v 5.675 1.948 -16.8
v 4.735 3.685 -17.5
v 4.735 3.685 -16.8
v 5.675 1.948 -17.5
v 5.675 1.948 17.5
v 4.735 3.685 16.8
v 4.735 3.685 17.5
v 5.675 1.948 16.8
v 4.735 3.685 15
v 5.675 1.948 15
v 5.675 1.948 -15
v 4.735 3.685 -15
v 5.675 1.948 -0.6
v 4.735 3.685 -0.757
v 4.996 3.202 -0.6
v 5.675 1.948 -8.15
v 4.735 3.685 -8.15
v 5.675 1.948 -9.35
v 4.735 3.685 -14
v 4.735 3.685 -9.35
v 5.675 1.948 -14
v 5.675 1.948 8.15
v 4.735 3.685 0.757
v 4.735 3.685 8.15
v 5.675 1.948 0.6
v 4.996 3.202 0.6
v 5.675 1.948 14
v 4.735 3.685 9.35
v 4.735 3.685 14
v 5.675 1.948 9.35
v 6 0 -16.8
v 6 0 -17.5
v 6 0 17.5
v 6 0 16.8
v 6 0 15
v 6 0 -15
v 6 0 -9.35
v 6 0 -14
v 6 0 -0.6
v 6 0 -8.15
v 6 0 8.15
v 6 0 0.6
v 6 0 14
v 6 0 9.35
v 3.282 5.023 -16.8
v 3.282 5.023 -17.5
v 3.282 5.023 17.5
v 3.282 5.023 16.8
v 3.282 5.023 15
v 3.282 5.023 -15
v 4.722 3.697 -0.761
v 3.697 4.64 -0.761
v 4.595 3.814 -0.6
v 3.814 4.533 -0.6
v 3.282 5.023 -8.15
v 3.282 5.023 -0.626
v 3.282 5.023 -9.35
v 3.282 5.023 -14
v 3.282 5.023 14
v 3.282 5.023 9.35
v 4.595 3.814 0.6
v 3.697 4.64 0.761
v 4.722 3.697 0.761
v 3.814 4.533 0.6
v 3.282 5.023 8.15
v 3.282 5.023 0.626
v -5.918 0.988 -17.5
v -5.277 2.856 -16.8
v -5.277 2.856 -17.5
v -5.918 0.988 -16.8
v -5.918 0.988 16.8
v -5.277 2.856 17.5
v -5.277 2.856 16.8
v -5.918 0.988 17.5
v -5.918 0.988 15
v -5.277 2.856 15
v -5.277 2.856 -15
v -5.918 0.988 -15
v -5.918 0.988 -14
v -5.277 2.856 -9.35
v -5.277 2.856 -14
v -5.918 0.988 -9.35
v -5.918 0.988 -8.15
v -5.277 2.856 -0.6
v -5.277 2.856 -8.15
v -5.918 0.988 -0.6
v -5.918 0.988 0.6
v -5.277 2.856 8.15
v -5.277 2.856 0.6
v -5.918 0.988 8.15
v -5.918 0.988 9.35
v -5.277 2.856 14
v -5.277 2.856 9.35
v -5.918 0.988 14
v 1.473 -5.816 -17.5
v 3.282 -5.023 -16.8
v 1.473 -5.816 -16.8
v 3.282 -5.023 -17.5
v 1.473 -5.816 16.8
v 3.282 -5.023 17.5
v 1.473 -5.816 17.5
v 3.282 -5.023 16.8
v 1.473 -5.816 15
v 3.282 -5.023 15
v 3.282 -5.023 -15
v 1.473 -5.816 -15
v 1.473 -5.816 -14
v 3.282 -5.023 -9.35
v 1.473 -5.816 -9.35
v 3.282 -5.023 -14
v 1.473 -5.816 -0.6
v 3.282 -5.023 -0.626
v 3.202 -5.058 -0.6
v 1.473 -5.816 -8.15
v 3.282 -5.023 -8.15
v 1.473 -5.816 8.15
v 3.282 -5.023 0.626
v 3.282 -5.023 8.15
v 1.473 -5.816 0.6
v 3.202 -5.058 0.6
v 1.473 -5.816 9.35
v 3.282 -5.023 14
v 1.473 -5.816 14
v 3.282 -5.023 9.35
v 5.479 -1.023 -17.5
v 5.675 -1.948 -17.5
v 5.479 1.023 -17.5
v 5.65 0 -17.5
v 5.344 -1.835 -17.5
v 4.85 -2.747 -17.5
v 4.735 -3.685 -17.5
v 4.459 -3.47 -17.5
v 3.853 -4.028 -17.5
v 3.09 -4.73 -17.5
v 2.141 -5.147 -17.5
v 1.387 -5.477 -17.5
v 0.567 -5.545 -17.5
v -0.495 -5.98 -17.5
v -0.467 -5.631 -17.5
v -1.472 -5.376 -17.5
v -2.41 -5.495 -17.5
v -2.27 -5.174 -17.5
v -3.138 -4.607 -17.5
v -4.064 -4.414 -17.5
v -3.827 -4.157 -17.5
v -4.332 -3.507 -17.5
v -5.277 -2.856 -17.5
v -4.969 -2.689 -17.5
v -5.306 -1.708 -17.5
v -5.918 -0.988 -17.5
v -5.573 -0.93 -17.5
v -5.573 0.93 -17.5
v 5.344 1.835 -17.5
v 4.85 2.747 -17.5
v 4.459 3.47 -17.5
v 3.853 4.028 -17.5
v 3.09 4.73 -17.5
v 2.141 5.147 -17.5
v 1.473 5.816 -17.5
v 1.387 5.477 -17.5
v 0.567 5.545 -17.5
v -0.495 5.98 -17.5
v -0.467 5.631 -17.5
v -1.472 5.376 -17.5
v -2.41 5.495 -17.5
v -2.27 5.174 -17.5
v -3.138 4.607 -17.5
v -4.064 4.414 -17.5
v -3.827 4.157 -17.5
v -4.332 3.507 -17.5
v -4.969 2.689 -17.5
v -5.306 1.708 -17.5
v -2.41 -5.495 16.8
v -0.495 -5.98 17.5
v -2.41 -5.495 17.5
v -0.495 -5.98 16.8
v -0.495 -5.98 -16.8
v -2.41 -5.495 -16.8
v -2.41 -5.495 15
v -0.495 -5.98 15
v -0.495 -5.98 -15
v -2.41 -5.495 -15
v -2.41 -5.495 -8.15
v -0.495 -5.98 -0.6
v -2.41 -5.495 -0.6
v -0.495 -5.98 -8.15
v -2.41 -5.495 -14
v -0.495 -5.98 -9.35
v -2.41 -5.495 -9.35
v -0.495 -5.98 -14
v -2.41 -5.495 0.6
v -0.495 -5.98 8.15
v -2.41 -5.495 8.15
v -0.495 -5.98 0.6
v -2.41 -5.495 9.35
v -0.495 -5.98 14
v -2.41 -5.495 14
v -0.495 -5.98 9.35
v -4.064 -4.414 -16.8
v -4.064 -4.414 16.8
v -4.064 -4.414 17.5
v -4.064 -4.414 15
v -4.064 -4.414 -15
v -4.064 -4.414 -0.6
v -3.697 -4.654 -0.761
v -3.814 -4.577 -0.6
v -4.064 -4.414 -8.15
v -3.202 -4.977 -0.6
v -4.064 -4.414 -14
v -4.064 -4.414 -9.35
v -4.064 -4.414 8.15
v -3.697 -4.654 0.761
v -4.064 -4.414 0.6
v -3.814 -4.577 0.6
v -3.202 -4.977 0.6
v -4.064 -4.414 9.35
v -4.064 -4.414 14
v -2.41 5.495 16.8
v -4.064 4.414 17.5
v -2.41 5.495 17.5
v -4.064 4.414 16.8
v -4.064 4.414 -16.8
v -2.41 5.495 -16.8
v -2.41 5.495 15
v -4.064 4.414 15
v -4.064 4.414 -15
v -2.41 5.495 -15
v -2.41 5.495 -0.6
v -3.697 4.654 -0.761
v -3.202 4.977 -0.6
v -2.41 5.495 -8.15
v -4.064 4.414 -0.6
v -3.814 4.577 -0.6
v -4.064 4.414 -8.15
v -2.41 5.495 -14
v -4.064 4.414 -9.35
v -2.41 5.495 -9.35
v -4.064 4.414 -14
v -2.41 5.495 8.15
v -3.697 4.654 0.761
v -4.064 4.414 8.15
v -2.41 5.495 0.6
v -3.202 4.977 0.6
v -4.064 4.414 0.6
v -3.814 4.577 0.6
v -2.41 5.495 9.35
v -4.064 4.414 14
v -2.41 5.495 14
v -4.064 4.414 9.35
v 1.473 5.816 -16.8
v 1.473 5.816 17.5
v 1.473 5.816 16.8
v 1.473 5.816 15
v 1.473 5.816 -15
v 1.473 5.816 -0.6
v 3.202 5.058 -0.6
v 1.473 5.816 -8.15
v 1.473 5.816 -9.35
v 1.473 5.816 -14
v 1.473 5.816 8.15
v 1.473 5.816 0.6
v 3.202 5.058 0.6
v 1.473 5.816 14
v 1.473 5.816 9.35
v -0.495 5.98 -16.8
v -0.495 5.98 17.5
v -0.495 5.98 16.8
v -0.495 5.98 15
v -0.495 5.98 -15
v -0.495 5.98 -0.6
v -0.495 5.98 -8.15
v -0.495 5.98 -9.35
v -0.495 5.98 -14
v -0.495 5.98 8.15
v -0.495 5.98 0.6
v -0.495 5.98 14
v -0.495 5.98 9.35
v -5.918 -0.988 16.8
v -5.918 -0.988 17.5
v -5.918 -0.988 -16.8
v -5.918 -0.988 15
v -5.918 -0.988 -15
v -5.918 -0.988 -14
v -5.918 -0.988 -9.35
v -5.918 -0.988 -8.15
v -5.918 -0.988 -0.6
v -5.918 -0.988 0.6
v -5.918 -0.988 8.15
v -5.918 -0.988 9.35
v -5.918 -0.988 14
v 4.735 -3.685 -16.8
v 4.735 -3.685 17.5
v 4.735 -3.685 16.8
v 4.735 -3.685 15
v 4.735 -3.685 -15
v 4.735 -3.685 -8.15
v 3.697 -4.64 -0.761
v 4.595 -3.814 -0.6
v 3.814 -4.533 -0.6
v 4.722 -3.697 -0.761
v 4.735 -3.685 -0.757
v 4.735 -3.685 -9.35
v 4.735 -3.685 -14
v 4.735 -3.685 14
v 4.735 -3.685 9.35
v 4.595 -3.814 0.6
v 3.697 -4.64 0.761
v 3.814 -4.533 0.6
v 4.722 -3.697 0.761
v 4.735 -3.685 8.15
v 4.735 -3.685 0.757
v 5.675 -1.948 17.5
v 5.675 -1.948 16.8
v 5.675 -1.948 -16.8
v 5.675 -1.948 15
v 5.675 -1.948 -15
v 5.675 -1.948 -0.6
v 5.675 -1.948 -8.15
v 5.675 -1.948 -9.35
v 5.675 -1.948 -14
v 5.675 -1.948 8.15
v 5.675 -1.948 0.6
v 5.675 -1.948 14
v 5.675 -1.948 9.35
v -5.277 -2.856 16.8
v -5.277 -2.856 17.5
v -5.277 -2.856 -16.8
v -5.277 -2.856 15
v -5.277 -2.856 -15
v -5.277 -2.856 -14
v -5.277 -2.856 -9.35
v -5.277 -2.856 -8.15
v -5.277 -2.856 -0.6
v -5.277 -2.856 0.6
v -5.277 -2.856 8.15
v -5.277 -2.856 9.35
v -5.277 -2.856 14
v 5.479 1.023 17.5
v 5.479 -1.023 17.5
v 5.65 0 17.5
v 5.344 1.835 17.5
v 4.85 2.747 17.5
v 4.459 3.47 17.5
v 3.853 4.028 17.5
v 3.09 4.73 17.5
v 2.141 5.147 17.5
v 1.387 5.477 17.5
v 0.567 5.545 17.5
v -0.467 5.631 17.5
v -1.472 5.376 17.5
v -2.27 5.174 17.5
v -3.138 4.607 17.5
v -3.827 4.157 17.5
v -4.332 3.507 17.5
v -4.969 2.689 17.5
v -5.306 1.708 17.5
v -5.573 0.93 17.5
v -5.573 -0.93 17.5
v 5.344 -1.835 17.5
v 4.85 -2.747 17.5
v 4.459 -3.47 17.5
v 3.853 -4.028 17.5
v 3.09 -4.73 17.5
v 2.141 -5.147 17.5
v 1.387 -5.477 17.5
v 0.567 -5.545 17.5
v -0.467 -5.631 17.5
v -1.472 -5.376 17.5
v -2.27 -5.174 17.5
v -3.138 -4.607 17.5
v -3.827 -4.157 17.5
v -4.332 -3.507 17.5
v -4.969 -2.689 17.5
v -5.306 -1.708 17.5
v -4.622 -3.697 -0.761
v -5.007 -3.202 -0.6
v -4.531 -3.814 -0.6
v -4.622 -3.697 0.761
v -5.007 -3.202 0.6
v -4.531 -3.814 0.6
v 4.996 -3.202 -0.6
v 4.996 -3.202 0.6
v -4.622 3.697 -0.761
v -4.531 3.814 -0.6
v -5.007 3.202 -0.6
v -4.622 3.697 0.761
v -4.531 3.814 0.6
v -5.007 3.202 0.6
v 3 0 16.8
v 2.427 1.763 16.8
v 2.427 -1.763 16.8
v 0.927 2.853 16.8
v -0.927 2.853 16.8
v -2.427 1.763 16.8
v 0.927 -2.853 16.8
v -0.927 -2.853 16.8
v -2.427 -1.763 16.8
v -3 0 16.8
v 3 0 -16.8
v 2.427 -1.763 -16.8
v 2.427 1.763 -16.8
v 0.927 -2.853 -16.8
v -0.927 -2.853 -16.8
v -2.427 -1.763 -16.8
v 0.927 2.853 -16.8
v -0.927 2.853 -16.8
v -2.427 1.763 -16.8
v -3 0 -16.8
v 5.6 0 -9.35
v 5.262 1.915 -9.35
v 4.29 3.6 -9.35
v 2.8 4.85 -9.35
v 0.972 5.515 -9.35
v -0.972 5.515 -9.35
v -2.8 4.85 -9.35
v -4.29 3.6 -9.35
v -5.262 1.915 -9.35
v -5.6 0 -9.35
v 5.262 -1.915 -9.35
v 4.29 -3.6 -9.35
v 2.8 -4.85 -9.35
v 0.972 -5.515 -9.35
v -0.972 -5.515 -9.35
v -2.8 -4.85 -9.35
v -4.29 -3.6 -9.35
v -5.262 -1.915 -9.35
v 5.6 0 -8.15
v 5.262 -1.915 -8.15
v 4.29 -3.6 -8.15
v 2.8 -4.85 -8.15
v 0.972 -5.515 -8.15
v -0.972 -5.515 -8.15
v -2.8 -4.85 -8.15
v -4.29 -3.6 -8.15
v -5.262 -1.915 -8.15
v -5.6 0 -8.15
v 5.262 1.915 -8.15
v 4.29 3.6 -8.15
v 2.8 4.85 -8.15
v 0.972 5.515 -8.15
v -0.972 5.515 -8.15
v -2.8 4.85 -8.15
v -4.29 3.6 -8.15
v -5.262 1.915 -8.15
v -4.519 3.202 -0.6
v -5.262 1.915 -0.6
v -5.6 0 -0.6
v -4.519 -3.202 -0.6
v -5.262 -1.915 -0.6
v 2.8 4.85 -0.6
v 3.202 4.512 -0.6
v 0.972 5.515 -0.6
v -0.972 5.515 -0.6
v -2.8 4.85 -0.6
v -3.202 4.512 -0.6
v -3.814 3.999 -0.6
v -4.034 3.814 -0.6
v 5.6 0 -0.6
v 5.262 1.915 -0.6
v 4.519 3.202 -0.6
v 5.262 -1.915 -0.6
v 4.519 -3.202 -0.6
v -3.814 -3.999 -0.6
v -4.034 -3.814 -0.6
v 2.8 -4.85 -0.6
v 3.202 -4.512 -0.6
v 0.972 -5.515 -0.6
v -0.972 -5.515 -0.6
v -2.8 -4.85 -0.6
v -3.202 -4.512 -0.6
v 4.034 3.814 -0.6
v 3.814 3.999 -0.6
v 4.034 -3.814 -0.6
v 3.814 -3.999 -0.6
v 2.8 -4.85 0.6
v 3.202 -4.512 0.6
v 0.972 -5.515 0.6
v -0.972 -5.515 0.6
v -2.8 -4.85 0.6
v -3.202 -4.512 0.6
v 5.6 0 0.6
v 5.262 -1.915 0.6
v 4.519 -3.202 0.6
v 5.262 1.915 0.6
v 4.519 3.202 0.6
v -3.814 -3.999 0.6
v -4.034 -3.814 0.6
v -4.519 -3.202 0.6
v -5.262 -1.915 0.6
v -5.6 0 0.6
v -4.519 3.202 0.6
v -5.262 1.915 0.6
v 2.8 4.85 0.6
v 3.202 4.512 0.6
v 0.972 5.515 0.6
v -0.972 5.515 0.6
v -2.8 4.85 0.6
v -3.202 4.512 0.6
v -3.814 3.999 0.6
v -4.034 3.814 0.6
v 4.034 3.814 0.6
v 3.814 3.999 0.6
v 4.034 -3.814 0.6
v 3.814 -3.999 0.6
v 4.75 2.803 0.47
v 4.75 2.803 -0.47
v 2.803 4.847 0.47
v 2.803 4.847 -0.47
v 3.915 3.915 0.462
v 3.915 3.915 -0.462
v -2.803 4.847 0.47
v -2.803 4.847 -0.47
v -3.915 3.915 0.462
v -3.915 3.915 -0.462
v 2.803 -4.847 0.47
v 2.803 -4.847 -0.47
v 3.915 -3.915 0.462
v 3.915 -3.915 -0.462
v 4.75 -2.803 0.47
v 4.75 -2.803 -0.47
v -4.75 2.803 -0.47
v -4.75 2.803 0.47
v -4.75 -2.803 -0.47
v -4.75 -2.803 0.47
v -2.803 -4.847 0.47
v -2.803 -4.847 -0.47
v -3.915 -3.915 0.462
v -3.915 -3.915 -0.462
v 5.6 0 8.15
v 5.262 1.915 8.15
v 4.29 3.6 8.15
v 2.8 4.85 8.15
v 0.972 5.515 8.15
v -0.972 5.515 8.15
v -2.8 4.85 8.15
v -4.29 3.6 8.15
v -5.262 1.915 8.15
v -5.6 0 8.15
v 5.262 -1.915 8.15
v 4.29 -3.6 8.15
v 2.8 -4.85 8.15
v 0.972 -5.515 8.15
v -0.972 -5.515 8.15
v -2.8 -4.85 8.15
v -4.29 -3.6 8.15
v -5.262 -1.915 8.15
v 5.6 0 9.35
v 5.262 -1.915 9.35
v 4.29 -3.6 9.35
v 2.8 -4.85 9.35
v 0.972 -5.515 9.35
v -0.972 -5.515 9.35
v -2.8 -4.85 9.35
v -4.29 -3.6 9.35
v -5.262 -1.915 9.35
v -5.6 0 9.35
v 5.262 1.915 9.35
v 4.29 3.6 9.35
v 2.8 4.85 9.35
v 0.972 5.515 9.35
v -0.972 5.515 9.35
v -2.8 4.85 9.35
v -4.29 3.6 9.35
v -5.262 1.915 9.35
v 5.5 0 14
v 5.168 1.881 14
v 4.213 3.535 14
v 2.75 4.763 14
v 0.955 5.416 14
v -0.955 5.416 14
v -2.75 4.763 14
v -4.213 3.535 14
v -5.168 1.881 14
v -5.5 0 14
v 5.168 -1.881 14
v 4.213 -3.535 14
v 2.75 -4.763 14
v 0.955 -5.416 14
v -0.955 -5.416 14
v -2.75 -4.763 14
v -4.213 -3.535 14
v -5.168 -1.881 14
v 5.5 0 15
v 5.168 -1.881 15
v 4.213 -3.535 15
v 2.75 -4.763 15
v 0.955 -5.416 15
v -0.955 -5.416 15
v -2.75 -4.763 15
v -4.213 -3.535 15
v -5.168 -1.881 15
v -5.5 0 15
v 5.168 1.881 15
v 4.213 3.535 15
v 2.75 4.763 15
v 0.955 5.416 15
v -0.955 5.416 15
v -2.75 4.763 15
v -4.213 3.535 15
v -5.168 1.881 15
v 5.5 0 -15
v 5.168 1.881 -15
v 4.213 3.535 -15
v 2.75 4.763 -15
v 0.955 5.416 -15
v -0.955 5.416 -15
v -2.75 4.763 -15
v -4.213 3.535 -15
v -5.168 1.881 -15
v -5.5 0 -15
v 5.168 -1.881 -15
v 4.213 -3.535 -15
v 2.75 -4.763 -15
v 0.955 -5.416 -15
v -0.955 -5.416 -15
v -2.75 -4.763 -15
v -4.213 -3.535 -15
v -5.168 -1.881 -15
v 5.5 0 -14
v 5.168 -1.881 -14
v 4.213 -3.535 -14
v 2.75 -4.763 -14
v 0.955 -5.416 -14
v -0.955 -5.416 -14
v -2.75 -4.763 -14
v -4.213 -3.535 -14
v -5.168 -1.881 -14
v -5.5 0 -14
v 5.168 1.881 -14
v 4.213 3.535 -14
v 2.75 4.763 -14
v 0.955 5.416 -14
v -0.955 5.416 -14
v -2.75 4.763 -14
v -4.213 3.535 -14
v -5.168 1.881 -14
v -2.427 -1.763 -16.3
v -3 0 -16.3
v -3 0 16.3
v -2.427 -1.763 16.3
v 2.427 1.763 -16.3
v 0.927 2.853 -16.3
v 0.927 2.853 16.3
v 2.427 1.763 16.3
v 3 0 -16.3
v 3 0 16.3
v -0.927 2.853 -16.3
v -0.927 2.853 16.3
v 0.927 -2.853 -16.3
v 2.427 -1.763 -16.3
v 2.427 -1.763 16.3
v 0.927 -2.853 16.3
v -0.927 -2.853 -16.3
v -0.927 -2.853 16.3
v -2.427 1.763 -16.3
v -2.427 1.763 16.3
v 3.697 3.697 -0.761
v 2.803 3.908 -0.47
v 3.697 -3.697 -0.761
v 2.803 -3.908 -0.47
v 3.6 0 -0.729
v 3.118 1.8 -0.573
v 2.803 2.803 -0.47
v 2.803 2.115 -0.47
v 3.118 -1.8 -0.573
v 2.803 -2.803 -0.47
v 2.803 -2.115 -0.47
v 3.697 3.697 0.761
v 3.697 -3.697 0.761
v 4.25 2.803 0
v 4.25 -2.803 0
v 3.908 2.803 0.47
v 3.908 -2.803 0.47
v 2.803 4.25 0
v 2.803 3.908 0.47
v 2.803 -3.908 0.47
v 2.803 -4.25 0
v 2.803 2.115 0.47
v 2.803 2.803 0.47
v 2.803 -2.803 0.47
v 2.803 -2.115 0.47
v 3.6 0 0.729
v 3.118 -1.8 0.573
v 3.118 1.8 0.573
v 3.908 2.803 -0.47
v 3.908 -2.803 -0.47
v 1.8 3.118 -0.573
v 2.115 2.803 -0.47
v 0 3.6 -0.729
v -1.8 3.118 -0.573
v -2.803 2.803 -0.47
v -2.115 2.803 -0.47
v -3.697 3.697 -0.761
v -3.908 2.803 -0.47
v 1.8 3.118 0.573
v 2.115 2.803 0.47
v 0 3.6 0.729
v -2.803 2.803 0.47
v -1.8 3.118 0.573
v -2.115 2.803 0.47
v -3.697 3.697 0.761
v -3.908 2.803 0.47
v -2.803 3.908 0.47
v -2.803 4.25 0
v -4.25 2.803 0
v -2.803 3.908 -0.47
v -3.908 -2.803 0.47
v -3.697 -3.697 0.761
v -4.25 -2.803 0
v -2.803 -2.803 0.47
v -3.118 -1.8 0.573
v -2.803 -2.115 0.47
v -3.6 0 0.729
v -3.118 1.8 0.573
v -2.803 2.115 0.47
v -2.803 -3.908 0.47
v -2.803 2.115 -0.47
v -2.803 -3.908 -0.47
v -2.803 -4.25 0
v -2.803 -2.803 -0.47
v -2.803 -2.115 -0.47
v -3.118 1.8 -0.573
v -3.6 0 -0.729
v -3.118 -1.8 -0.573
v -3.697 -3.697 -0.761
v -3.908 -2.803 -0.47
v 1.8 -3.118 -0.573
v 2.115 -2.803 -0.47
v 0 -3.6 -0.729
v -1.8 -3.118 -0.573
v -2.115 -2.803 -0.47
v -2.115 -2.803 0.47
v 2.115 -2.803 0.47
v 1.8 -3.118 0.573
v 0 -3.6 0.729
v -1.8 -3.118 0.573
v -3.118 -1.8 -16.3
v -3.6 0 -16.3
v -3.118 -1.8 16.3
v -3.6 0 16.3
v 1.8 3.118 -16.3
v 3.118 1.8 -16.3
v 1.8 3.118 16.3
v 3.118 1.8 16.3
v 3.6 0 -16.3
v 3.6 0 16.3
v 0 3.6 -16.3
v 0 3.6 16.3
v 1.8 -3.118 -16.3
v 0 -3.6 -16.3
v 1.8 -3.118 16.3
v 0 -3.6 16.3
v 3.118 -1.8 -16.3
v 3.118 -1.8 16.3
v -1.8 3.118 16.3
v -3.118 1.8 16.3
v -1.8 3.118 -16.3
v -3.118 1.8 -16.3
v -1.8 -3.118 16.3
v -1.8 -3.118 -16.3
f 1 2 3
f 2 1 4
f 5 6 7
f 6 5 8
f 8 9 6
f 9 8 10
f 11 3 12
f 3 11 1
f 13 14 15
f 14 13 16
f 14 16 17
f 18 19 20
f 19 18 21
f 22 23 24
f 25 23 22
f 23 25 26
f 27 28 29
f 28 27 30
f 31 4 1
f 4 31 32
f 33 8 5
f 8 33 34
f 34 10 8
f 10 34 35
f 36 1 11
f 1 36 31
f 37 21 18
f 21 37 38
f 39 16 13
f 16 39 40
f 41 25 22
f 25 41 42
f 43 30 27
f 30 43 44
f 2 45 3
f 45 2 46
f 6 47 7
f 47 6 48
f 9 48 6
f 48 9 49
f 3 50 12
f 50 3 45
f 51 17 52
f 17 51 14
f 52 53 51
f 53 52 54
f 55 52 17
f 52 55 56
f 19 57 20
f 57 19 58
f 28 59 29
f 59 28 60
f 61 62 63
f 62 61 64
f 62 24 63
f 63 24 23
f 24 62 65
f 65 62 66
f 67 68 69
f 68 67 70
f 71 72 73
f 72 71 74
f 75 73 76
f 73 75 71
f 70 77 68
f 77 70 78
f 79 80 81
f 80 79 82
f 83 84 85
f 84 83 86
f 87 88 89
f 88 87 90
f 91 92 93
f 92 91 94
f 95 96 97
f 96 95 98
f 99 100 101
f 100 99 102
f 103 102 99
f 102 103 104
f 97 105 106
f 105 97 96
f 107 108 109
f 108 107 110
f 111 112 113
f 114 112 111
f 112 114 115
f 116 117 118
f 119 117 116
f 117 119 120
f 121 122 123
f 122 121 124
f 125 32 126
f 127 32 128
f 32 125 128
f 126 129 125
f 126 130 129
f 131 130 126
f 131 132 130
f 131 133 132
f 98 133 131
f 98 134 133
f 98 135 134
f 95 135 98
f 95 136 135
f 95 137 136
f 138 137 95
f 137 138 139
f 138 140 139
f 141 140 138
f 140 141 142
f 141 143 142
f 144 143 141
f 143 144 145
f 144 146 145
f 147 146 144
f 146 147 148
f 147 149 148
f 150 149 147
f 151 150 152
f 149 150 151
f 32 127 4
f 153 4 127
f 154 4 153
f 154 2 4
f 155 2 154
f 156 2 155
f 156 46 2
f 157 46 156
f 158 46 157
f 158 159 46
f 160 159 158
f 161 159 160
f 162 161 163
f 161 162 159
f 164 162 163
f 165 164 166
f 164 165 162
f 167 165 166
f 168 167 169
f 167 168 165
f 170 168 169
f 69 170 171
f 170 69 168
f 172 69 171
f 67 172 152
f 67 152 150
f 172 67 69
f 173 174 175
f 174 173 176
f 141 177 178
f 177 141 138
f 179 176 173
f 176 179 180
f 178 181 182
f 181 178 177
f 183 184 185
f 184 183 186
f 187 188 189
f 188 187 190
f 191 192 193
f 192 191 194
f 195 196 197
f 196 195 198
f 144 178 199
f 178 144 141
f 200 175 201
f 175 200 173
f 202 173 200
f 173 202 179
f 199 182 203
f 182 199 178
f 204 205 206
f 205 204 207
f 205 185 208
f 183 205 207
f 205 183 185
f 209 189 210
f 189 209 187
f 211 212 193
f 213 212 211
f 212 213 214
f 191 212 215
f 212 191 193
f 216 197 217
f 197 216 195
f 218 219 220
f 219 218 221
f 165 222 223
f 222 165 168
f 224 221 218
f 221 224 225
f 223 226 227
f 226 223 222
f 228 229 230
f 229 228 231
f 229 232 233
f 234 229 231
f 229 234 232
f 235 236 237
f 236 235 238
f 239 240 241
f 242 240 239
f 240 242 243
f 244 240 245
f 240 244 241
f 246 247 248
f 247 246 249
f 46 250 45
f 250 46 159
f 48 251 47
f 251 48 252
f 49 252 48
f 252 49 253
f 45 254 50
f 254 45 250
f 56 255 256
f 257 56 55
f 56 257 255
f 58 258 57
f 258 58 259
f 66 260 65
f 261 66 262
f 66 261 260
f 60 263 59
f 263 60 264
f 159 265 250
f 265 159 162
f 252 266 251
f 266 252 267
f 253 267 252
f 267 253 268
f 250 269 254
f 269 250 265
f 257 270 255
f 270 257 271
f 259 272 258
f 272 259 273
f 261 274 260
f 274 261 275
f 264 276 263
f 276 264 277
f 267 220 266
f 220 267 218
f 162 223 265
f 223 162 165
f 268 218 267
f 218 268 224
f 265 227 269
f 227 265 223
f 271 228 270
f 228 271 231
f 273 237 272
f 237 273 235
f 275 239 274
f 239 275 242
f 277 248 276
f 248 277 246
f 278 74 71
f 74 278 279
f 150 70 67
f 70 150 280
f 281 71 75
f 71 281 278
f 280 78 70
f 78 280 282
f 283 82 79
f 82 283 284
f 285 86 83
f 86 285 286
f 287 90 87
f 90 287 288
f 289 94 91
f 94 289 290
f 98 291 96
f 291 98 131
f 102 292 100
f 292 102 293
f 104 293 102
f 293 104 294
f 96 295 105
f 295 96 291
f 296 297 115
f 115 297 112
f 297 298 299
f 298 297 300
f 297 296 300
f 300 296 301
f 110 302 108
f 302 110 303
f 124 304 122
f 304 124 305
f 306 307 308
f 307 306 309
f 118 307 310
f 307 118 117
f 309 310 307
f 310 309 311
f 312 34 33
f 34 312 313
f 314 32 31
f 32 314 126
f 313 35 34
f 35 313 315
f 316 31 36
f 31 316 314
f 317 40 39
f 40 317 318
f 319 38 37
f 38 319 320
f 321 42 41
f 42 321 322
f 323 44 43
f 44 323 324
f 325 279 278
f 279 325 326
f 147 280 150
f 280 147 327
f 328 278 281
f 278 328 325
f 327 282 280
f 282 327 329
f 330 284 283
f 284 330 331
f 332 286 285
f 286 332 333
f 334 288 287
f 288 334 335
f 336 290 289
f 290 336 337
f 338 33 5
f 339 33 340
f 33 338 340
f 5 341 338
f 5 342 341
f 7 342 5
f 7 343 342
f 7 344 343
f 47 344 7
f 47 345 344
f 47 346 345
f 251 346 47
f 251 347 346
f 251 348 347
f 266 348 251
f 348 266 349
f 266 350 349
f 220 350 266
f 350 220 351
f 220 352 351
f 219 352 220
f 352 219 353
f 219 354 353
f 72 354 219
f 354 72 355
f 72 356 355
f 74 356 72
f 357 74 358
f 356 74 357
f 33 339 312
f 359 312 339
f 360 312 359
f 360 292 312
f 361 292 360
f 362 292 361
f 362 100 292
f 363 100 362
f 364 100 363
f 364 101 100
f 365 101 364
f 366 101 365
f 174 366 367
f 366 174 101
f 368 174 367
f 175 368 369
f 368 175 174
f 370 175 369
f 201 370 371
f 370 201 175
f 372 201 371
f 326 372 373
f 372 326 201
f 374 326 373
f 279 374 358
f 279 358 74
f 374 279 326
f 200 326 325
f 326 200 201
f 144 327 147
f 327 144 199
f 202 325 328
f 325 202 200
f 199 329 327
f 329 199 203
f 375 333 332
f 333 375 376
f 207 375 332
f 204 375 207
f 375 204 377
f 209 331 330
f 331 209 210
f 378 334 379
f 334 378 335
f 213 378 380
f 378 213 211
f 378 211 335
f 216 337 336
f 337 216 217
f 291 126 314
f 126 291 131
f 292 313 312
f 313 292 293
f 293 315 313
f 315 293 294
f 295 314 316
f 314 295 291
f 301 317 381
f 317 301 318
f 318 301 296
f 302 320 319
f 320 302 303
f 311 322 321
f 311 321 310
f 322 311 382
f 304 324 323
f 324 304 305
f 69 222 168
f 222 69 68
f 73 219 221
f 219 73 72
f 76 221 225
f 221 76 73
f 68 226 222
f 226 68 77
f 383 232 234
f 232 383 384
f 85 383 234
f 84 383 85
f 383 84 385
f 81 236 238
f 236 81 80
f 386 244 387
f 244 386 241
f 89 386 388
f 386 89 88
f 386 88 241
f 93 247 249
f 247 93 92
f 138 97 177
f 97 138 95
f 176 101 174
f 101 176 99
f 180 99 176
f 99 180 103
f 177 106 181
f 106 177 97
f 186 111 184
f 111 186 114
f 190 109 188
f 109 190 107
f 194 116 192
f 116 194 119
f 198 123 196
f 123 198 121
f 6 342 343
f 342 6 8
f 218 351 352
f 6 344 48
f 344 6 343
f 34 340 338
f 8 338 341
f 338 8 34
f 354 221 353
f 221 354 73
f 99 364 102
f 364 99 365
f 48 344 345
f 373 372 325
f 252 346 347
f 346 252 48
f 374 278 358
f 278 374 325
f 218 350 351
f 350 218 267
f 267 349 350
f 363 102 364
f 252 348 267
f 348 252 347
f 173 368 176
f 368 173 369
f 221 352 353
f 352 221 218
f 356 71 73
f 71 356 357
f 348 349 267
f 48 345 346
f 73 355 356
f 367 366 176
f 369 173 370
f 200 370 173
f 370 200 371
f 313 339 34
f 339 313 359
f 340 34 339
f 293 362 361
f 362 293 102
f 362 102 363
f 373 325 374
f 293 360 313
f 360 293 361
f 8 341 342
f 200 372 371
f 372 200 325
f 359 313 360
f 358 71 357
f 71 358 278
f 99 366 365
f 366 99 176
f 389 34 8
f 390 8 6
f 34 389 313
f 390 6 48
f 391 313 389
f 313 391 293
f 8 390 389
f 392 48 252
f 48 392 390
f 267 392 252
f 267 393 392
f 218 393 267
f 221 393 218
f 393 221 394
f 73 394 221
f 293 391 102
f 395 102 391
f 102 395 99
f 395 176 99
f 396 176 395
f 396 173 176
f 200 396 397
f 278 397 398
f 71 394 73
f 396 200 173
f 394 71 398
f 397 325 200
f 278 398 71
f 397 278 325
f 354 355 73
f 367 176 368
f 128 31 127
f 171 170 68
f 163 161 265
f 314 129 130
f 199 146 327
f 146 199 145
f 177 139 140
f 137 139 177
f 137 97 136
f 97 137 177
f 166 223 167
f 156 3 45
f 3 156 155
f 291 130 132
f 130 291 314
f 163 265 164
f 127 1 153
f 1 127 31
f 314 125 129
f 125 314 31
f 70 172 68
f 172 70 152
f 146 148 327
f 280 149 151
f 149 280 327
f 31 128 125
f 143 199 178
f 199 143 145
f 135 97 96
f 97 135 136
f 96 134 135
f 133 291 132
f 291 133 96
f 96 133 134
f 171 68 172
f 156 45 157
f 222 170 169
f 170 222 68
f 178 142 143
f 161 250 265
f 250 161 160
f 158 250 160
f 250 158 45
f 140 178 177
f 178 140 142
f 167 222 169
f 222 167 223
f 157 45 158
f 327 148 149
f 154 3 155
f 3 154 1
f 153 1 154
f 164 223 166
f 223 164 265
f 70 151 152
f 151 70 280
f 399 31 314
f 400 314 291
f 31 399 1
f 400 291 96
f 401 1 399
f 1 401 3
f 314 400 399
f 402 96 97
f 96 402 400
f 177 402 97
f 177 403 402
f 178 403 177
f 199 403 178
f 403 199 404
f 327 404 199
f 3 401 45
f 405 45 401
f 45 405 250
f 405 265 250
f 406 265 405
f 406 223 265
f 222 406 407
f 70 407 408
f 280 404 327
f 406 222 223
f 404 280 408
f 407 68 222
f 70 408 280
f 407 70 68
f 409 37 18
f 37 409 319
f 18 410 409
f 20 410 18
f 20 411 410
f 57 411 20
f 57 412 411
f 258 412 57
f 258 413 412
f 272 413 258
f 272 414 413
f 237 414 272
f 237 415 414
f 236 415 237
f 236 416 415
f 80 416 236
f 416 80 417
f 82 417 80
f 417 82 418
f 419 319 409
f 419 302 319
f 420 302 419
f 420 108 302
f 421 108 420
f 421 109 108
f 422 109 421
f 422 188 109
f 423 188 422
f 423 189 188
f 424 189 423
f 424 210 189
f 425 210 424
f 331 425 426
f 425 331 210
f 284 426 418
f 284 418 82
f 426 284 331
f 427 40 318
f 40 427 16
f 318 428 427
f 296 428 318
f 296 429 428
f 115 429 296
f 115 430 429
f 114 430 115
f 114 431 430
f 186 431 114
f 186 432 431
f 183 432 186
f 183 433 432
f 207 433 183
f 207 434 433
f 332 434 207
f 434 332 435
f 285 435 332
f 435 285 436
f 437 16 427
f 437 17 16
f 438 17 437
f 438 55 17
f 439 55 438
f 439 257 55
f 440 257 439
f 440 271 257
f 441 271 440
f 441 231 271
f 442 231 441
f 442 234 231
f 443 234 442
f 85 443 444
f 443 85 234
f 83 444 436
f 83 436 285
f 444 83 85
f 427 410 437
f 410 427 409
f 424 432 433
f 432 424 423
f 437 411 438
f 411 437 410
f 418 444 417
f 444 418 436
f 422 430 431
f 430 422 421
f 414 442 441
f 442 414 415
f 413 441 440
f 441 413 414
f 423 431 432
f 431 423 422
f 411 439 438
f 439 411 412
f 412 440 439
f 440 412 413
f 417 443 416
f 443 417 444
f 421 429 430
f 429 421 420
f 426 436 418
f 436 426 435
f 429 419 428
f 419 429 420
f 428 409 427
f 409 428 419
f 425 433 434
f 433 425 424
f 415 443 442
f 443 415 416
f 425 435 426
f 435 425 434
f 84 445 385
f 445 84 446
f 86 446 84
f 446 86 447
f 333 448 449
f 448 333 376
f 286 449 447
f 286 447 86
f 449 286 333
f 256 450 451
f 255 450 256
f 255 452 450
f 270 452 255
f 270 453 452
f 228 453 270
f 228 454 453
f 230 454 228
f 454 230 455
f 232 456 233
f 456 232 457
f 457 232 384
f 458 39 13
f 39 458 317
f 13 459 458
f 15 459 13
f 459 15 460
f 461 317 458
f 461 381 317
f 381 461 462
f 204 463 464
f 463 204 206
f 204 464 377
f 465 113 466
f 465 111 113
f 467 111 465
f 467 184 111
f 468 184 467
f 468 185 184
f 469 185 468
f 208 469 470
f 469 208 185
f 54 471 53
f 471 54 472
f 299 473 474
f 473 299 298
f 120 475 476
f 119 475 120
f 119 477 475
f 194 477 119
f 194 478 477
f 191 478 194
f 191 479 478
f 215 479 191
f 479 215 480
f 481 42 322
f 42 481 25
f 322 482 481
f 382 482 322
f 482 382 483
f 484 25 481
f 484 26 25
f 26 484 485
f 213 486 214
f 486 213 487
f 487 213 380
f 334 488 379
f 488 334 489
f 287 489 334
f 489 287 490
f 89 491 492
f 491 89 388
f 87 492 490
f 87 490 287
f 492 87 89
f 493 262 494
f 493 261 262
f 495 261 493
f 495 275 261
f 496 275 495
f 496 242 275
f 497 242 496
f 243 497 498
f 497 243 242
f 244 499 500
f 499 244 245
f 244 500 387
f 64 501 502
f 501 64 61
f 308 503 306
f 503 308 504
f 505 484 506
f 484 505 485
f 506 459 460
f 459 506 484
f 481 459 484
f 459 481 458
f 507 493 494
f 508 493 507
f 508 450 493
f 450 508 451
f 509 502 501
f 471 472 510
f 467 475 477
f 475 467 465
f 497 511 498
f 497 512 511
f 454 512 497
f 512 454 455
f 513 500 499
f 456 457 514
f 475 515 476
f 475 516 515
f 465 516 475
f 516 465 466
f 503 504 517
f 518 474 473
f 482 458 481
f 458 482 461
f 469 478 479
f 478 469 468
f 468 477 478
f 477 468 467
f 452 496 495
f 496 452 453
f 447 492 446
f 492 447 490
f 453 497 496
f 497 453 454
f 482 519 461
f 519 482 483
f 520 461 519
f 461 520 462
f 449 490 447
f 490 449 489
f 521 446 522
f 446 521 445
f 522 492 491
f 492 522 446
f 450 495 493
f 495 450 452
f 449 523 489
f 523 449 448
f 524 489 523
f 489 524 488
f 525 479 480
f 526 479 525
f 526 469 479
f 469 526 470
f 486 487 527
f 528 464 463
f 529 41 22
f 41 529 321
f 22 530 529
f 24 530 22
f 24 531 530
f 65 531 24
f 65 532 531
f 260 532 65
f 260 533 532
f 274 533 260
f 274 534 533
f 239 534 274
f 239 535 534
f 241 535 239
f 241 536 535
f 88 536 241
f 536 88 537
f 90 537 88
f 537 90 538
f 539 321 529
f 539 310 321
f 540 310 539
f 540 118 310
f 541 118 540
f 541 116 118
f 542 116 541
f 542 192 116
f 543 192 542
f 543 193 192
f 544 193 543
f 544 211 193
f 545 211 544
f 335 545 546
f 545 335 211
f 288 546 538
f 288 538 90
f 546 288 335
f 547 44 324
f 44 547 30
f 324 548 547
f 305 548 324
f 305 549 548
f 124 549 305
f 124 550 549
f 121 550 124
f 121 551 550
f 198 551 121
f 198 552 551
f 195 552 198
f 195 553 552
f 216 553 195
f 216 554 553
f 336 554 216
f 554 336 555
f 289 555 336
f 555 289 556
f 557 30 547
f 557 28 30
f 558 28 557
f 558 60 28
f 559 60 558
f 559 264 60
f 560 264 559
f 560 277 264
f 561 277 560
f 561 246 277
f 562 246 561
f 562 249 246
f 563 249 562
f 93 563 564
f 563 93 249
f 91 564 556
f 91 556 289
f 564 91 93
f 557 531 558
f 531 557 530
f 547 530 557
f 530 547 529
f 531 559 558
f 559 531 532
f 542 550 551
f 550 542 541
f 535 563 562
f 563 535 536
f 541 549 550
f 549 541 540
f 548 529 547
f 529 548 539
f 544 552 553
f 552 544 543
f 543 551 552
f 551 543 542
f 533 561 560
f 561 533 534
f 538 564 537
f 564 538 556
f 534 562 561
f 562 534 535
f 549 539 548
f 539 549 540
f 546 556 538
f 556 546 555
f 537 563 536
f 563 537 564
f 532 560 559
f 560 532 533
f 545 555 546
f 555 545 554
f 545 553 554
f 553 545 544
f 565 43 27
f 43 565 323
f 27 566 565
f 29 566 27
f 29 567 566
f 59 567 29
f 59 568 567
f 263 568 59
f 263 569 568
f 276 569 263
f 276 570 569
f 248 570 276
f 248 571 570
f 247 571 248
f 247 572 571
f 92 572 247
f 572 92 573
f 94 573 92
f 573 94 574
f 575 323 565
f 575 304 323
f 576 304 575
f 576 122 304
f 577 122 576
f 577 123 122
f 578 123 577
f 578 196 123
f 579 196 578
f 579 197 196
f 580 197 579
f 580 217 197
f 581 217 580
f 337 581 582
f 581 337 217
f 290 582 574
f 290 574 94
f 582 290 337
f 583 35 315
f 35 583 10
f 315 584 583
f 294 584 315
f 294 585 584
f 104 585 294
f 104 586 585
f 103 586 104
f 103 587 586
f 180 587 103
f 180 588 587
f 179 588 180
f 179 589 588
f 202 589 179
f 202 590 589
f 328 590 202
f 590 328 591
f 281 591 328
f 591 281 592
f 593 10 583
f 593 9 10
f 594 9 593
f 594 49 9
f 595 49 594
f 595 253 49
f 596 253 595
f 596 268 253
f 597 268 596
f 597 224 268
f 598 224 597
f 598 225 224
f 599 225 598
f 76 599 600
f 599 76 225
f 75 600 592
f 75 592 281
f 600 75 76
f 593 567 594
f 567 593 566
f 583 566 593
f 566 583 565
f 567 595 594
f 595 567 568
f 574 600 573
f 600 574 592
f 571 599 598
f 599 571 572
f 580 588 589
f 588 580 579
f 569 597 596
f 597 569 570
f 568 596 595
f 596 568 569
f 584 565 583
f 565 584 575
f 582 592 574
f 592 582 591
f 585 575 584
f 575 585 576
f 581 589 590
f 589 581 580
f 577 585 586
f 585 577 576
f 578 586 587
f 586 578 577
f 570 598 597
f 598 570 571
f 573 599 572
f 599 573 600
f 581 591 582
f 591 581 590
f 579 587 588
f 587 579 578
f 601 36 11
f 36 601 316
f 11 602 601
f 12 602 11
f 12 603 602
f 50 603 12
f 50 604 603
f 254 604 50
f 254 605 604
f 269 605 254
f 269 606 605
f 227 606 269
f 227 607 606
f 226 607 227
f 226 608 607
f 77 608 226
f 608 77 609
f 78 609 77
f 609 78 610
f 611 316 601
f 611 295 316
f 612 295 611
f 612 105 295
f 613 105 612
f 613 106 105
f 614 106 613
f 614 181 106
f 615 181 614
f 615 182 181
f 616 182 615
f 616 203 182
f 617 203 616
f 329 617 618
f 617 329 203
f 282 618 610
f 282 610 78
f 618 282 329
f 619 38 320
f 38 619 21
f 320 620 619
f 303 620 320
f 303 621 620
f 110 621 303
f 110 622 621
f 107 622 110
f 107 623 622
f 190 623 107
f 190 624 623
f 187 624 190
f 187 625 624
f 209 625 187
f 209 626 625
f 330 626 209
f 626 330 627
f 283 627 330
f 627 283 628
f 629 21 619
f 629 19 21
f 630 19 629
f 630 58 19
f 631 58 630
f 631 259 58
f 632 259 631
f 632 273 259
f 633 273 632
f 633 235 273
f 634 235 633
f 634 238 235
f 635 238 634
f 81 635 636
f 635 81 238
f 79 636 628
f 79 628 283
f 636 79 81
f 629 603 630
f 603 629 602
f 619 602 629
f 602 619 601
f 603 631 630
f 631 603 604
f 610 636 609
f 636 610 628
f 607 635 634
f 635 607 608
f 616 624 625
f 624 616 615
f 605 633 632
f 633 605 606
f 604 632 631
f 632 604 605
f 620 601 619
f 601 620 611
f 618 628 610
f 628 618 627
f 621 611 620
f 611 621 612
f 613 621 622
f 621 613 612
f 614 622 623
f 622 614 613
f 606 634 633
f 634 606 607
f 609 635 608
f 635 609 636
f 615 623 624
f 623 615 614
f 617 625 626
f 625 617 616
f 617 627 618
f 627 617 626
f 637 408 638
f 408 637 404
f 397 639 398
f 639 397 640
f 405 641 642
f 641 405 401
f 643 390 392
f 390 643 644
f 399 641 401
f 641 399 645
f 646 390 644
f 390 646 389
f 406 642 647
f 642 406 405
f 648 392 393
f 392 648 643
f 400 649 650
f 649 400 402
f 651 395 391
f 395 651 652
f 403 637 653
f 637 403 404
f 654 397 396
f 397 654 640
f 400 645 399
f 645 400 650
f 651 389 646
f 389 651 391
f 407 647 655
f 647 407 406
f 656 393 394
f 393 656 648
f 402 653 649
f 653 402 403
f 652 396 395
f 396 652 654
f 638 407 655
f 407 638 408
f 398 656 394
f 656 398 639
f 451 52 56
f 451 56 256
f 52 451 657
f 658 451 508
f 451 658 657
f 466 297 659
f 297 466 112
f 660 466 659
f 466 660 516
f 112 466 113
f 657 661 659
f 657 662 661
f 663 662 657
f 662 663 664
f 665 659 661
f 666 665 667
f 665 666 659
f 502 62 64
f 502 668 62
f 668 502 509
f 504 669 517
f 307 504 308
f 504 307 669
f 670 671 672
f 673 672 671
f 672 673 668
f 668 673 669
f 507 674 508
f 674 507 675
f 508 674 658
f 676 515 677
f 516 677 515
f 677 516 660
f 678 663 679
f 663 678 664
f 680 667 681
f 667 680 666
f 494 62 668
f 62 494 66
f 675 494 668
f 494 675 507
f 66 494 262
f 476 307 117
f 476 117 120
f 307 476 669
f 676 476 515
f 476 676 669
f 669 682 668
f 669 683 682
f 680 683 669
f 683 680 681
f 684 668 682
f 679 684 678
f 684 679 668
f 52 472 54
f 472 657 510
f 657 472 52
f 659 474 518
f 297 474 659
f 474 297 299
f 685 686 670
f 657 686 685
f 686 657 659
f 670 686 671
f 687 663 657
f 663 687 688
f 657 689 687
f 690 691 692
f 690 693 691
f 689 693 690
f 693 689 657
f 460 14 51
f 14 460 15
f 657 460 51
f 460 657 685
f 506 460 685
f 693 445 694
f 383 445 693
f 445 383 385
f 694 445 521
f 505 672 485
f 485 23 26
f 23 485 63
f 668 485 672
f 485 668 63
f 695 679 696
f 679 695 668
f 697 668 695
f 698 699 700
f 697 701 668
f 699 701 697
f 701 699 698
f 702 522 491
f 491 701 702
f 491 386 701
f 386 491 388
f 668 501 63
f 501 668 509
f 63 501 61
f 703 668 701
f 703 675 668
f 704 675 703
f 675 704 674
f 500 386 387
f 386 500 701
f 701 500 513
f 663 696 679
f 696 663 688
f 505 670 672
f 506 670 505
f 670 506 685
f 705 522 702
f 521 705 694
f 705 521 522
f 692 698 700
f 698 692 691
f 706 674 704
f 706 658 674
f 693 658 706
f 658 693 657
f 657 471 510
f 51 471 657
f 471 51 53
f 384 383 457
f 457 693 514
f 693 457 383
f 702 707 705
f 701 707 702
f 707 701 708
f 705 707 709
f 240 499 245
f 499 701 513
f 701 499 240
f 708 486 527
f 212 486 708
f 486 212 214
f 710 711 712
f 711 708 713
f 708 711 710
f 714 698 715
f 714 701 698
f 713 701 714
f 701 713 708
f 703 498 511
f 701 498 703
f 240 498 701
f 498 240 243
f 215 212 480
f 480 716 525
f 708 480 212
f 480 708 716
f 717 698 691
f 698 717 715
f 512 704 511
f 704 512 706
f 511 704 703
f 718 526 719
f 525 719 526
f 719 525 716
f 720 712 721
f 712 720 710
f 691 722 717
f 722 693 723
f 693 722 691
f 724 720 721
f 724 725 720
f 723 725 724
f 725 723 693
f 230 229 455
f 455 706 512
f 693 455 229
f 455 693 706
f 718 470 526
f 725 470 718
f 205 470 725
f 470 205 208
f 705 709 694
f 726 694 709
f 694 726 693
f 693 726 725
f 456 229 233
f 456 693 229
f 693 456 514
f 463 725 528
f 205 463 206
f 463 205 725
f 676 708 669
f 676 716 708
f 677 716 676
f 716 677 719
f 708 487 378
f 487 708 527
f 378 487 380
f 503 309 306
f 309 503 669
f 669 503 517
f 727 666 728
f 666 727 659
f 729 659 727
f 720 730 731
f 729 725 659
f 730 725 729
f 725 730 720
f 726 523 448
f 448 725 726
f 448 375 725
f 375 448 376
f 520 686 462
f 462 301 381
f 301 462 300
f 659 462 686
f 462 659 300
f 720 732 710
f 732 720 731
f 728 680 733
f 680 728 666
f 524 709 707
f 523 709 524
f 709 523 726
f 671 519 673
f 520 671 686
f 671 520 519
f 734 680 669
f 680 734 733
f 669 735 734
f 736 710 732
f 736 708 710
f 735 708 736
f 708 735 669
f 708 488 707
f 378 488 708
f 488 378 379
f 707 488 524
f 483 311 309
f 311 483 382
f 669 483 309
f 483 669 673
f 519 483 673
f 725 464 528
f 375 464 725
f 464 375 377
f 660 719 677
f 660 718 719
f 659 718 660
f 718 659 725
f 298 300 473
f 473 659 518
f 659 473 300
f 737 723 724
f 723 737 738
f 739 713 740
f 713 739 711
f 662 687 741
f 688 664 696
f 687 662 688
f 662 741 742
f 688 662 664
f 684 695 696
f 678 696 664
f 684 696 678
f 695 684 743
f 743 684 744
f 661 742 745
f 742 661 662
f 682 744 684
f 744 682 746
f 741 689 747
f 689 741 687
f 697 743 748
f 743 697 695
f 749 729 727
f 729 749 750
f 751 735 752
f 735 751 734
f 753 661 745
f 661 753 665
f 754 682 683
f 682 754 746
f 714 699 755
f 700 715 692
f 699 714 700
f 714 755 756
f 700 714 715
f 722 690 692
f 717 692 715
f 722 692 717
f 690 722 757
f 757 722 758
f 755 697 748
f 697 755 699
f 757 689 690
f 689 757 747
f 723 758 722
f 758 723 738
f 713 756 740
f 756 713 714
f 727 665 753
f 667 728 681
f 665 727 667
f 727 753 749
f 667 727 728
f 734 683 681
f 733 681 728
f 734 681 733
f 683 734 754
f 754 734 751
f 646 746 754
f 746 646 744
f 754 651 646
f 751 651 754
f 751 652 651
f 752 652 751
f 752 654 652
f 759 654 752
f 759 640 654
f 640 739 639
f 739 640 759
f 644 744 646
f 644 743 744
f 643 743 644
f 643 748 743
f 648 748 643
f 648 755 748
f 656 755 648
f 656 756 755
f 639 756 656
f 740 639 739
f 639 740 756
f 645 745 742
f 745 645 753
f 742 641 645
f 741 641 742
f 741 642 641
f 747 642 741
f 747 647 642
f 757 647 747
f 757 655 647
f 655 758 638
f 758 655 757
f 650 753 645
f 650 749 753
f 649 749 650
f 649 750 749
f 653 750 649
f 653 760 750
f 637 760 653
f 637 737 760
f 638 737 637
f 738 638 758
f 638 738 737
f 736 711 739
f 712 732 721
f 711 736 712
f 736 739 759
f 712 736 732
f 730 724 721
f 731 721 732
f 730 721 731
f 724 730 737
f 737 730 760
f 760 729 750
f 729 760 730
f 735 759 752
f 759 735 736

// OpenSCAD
// Parameters
bearing_L = 35.0; //[17.5:70.0:0.5]
bearing_OD = 12.0; //[6.0:24.0:0.5]
bearing_ID = 6.0; //[3.0:12.0:0.5]
eps_overlap = 1.0; //[0.5:2.0:0.1]
lead_in_len = 1.2; //[0.5:3.0:0.1]
lead_in_rad = 0.6; //[0.2:1.5:0.1]
lube_groove_width = 1.2; //[0.6:3.0:0.1]
lube_groove_depth = 0.4; //[0.2:1.0:0.05]
lube_groove_count = 3.0; //[1.0:6.0:1.0]
ret_groove_width = 1.0; //[0.6:2.5:0.1]
ret_groove_depth = 0.5; //[0.2:1.2:0.05]
ret_groove_offset = 3.0; //[1.5:6.0:0.5]
track_depth = 0.35; //[0.15:0.8:0.05]
track_radius = 0.8; //[0.4:1.6:0.05]
track_count = 4.0; //[3.0:8.0:1.0]
cage_relief_thickness = 0.6; //[0.3:1.5:0.1]

// Base Shapes
module outer_cylinder_body() {
  cylinder(h=bearing_L, r=bearing_OD/2, center=true);
}

module through_bore() {
  cylinder(h=bearing_L + 2*eps_overlap, r=bearing_ID/2, center=true);
}

module chamfer_or_lead_in_top() {
  translate([0, 0, bearing_L/2 - lead_in_len/2 + eps_overlap/2])
    cylinder(h=lead_in_len, r1=bearing_OD/2, r2=bearing_OD/2 - lead_in_rad, center=true);
}

module chamfer_or_lead_in_bottom() {
  translate([0, 0, -bearing_L/2 + lead_in_len/2 - eps_overlap/2])
    cylinder(h=lead_in_len, r1=bearing_OD/2 - lead_in_rad, r2=bearing_OD/2, center=true);
}

module lubrication_groove(position) {
  difference() {
    translate([0, 0, position])
      cylinder(h=lube_groove_width, r=bearing_OD/2, center=true);
    translate([0, 0, position])
      cylinder(h=lube_groove_width + 2*eps_overlap, r=bearing_OD/2 - lube_groove_depth, center=true);
  }
}

module retaining_ring_groove(position) {
  difference() {
    translate([0, 0, position])
      cylinder(h=ret_groove_width, r=bearing_OD/2, center=true);
    translate([0, 0, position])
      cylinder(h=ret_groove_width + 2*eps_overlap, r=bearing_OD/2 - ret_groove_depth, center=true);
  }
}

module ball_track_cutter(angle) {
  rotate([90, 0, angle])
    translate([bearing_ID/2 + track_radius - track_depth, 0, 0])
      cylinder(h=bearing_L + 2*eps_overlap, r=track_radius, center=true);
}

module ball_cage_relief() {
  cylinder(h=bearing_L - 2*lead_in_len, r=bearing_ID/2 + cage_relief_thickness, center=true);
}

// Operations
module complete_bearing_model() {
  difference() {
    difference() {
      difference() {
        difference() {
          difference() {
            difference() {
              outer_cylinder_body();
              chamfer_or_lead_in_top();
              chamfer_or_lead_in_bottom();
            }
            lubrication_groove(-bearing_L/4);
            lubrication_groove(0);
            lubrication_groove(bearing_L/4);
          }
          retaining_ring_groove(bearing_L/2 - ret_groove_offset);
          retaining_ring_groove(-bearing_L/2 + ret_groove_offset);
        }
        through_bore();
      }
      ball_track_cutter(0);
      ball_track_cutter(90);
      ball_track_cutter(180);
      ball_track_cutter(270);
    }
    ball_cage_relief();
  }
}

// Final Output
complete_bearing_model();
